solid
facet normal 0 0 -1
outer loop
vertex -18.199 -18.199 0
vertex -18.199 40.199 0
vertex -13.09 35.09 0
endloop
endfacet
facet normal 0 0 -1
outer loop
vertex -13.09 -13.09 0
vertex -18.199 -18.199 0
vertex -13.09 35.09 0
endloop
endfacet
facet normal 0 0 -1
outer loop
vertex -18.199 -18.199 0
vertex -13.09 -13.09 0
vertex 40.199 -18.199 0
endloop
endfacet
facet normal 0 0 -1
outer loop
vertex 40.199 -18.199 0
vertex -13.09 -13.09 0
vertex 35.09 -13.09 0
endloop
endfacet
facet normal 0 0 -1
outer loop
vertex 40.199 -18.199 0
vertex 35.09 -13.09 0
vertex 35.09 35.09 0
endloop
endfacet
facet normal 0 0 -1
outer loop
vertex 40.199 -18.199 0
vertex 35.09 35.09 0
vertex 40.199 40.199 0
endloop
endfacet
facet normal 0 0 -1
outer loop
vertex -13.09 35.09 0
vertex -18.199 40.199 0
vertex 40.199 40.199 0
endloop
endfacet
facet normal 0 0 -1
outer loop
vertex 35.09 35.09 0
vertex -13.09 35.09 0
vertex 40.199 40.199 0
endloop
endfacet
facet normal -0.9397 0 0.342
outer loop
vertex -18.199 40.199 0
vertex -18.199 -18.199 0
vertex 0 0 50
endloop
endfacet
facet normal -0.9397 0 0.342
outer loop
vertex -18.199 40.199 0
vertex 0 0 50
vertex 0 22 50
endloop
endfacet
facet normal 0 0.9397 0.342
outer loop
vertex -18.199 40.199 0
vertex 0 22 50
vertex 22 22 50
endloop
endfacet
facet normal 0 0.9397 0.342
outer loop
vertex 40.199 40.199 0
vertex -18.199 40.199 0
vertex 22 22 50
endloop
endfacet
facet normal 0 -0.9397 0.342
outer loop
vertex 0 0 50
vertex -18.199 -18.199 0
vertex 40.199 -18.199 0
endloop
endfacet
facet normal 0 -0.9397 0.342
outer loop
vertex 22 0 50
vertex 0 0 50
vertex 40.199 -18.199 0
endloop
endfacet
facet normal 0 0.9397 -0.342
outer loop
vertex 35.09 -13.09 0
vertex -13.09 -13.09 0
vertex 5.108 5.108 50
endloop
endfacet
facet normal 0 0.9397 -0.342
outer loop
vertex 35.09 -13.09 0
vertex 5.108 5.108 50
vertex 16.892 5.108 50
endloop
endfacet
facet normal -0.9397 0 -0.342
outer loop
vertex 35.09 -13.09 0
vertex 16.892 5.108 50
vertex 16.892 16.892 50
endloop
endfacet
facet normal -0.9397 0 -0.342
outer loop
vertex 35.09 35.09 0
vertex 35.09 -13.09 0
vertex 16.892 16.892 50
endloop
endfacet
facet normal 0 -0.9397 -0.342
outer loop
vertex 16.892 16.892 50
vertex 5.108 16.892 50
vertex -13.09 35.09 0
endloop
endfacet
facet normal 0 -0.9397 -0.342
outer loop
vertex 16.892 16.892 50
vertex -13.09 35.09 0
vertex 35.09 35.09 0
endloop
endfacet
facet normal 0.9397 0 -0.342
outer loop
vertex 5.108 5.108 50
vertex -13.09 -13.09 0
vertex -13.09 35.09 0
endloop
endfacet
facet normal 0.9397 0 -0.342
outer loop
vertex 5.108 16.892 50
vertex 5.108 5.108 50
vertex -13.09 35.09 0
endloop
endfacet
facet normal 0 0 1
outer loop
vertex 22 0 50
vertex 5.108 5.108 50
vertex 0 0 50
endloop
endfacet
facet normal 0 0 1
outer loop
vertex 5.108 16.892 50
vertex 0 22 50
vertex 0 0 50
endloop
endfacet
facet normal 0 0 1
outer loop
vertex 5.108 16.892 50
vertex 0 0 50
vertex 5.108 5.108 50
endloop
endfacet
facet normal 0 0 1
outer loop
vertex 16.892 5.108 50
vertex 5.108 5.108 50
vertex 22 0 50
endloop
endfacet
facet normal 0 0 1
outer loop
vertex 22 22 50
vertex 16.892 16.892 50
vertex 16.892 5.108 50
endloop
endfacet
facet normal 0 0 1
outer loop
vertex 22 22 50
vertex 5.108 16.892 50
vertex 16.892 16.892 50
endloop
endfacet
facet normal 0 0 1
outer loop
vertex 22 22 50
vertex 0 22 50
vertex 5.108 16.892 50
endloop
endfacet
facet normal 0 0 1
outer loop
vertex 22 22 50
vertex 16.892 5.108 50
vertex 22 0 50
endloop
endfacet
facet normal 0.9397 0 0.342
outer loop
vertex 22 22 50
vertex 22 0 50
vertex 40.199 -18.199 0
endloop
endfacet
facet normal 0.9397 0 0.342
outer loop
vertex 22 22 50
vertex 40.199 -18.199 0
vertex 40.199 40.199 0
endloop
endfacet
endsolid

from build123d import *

# Parameters (mm, degrees)
SKETCH7_W           = 22
SKETCH7_H           = 22
BOSS_EXTRUDE2_DEPTH = 50
DRAFT2_ANGLE        = 20
SHELL2_T            = -4.8


with BuildPart() as part:
    # Sketch7 → Boss-Extrude2 (new body)
    with BuildSketch(Plane.XY):
        with Locations((11, 11)):
            Rectangle(SKETCH7_W, SKETCH7_H)
    extrude(amount=BOSS_EXTRUDE2_DEPTH)

    # Draft2
    draft2_faces = [part.faces().sort_by_distance(p)[0] for p in [
        (22, 11, 25),
        (11, 0, 25),
        (0, 11, 25),
        (11, 22, 25),
    ]]
    draft(draft2_faces, Plane.XY.offset(50), DRAFT2_ANGLE)

    # Shell2
    shell2_openings = [part.faces().sort_by_distance(p)[0] for p in [
        (11, 11, 50),
        (11, 11, 0),
    ]]
    offset(amount=SHELL2_T, openings=shell2_openings, kind=Kind.INTERSECTION)


solid = part.part
